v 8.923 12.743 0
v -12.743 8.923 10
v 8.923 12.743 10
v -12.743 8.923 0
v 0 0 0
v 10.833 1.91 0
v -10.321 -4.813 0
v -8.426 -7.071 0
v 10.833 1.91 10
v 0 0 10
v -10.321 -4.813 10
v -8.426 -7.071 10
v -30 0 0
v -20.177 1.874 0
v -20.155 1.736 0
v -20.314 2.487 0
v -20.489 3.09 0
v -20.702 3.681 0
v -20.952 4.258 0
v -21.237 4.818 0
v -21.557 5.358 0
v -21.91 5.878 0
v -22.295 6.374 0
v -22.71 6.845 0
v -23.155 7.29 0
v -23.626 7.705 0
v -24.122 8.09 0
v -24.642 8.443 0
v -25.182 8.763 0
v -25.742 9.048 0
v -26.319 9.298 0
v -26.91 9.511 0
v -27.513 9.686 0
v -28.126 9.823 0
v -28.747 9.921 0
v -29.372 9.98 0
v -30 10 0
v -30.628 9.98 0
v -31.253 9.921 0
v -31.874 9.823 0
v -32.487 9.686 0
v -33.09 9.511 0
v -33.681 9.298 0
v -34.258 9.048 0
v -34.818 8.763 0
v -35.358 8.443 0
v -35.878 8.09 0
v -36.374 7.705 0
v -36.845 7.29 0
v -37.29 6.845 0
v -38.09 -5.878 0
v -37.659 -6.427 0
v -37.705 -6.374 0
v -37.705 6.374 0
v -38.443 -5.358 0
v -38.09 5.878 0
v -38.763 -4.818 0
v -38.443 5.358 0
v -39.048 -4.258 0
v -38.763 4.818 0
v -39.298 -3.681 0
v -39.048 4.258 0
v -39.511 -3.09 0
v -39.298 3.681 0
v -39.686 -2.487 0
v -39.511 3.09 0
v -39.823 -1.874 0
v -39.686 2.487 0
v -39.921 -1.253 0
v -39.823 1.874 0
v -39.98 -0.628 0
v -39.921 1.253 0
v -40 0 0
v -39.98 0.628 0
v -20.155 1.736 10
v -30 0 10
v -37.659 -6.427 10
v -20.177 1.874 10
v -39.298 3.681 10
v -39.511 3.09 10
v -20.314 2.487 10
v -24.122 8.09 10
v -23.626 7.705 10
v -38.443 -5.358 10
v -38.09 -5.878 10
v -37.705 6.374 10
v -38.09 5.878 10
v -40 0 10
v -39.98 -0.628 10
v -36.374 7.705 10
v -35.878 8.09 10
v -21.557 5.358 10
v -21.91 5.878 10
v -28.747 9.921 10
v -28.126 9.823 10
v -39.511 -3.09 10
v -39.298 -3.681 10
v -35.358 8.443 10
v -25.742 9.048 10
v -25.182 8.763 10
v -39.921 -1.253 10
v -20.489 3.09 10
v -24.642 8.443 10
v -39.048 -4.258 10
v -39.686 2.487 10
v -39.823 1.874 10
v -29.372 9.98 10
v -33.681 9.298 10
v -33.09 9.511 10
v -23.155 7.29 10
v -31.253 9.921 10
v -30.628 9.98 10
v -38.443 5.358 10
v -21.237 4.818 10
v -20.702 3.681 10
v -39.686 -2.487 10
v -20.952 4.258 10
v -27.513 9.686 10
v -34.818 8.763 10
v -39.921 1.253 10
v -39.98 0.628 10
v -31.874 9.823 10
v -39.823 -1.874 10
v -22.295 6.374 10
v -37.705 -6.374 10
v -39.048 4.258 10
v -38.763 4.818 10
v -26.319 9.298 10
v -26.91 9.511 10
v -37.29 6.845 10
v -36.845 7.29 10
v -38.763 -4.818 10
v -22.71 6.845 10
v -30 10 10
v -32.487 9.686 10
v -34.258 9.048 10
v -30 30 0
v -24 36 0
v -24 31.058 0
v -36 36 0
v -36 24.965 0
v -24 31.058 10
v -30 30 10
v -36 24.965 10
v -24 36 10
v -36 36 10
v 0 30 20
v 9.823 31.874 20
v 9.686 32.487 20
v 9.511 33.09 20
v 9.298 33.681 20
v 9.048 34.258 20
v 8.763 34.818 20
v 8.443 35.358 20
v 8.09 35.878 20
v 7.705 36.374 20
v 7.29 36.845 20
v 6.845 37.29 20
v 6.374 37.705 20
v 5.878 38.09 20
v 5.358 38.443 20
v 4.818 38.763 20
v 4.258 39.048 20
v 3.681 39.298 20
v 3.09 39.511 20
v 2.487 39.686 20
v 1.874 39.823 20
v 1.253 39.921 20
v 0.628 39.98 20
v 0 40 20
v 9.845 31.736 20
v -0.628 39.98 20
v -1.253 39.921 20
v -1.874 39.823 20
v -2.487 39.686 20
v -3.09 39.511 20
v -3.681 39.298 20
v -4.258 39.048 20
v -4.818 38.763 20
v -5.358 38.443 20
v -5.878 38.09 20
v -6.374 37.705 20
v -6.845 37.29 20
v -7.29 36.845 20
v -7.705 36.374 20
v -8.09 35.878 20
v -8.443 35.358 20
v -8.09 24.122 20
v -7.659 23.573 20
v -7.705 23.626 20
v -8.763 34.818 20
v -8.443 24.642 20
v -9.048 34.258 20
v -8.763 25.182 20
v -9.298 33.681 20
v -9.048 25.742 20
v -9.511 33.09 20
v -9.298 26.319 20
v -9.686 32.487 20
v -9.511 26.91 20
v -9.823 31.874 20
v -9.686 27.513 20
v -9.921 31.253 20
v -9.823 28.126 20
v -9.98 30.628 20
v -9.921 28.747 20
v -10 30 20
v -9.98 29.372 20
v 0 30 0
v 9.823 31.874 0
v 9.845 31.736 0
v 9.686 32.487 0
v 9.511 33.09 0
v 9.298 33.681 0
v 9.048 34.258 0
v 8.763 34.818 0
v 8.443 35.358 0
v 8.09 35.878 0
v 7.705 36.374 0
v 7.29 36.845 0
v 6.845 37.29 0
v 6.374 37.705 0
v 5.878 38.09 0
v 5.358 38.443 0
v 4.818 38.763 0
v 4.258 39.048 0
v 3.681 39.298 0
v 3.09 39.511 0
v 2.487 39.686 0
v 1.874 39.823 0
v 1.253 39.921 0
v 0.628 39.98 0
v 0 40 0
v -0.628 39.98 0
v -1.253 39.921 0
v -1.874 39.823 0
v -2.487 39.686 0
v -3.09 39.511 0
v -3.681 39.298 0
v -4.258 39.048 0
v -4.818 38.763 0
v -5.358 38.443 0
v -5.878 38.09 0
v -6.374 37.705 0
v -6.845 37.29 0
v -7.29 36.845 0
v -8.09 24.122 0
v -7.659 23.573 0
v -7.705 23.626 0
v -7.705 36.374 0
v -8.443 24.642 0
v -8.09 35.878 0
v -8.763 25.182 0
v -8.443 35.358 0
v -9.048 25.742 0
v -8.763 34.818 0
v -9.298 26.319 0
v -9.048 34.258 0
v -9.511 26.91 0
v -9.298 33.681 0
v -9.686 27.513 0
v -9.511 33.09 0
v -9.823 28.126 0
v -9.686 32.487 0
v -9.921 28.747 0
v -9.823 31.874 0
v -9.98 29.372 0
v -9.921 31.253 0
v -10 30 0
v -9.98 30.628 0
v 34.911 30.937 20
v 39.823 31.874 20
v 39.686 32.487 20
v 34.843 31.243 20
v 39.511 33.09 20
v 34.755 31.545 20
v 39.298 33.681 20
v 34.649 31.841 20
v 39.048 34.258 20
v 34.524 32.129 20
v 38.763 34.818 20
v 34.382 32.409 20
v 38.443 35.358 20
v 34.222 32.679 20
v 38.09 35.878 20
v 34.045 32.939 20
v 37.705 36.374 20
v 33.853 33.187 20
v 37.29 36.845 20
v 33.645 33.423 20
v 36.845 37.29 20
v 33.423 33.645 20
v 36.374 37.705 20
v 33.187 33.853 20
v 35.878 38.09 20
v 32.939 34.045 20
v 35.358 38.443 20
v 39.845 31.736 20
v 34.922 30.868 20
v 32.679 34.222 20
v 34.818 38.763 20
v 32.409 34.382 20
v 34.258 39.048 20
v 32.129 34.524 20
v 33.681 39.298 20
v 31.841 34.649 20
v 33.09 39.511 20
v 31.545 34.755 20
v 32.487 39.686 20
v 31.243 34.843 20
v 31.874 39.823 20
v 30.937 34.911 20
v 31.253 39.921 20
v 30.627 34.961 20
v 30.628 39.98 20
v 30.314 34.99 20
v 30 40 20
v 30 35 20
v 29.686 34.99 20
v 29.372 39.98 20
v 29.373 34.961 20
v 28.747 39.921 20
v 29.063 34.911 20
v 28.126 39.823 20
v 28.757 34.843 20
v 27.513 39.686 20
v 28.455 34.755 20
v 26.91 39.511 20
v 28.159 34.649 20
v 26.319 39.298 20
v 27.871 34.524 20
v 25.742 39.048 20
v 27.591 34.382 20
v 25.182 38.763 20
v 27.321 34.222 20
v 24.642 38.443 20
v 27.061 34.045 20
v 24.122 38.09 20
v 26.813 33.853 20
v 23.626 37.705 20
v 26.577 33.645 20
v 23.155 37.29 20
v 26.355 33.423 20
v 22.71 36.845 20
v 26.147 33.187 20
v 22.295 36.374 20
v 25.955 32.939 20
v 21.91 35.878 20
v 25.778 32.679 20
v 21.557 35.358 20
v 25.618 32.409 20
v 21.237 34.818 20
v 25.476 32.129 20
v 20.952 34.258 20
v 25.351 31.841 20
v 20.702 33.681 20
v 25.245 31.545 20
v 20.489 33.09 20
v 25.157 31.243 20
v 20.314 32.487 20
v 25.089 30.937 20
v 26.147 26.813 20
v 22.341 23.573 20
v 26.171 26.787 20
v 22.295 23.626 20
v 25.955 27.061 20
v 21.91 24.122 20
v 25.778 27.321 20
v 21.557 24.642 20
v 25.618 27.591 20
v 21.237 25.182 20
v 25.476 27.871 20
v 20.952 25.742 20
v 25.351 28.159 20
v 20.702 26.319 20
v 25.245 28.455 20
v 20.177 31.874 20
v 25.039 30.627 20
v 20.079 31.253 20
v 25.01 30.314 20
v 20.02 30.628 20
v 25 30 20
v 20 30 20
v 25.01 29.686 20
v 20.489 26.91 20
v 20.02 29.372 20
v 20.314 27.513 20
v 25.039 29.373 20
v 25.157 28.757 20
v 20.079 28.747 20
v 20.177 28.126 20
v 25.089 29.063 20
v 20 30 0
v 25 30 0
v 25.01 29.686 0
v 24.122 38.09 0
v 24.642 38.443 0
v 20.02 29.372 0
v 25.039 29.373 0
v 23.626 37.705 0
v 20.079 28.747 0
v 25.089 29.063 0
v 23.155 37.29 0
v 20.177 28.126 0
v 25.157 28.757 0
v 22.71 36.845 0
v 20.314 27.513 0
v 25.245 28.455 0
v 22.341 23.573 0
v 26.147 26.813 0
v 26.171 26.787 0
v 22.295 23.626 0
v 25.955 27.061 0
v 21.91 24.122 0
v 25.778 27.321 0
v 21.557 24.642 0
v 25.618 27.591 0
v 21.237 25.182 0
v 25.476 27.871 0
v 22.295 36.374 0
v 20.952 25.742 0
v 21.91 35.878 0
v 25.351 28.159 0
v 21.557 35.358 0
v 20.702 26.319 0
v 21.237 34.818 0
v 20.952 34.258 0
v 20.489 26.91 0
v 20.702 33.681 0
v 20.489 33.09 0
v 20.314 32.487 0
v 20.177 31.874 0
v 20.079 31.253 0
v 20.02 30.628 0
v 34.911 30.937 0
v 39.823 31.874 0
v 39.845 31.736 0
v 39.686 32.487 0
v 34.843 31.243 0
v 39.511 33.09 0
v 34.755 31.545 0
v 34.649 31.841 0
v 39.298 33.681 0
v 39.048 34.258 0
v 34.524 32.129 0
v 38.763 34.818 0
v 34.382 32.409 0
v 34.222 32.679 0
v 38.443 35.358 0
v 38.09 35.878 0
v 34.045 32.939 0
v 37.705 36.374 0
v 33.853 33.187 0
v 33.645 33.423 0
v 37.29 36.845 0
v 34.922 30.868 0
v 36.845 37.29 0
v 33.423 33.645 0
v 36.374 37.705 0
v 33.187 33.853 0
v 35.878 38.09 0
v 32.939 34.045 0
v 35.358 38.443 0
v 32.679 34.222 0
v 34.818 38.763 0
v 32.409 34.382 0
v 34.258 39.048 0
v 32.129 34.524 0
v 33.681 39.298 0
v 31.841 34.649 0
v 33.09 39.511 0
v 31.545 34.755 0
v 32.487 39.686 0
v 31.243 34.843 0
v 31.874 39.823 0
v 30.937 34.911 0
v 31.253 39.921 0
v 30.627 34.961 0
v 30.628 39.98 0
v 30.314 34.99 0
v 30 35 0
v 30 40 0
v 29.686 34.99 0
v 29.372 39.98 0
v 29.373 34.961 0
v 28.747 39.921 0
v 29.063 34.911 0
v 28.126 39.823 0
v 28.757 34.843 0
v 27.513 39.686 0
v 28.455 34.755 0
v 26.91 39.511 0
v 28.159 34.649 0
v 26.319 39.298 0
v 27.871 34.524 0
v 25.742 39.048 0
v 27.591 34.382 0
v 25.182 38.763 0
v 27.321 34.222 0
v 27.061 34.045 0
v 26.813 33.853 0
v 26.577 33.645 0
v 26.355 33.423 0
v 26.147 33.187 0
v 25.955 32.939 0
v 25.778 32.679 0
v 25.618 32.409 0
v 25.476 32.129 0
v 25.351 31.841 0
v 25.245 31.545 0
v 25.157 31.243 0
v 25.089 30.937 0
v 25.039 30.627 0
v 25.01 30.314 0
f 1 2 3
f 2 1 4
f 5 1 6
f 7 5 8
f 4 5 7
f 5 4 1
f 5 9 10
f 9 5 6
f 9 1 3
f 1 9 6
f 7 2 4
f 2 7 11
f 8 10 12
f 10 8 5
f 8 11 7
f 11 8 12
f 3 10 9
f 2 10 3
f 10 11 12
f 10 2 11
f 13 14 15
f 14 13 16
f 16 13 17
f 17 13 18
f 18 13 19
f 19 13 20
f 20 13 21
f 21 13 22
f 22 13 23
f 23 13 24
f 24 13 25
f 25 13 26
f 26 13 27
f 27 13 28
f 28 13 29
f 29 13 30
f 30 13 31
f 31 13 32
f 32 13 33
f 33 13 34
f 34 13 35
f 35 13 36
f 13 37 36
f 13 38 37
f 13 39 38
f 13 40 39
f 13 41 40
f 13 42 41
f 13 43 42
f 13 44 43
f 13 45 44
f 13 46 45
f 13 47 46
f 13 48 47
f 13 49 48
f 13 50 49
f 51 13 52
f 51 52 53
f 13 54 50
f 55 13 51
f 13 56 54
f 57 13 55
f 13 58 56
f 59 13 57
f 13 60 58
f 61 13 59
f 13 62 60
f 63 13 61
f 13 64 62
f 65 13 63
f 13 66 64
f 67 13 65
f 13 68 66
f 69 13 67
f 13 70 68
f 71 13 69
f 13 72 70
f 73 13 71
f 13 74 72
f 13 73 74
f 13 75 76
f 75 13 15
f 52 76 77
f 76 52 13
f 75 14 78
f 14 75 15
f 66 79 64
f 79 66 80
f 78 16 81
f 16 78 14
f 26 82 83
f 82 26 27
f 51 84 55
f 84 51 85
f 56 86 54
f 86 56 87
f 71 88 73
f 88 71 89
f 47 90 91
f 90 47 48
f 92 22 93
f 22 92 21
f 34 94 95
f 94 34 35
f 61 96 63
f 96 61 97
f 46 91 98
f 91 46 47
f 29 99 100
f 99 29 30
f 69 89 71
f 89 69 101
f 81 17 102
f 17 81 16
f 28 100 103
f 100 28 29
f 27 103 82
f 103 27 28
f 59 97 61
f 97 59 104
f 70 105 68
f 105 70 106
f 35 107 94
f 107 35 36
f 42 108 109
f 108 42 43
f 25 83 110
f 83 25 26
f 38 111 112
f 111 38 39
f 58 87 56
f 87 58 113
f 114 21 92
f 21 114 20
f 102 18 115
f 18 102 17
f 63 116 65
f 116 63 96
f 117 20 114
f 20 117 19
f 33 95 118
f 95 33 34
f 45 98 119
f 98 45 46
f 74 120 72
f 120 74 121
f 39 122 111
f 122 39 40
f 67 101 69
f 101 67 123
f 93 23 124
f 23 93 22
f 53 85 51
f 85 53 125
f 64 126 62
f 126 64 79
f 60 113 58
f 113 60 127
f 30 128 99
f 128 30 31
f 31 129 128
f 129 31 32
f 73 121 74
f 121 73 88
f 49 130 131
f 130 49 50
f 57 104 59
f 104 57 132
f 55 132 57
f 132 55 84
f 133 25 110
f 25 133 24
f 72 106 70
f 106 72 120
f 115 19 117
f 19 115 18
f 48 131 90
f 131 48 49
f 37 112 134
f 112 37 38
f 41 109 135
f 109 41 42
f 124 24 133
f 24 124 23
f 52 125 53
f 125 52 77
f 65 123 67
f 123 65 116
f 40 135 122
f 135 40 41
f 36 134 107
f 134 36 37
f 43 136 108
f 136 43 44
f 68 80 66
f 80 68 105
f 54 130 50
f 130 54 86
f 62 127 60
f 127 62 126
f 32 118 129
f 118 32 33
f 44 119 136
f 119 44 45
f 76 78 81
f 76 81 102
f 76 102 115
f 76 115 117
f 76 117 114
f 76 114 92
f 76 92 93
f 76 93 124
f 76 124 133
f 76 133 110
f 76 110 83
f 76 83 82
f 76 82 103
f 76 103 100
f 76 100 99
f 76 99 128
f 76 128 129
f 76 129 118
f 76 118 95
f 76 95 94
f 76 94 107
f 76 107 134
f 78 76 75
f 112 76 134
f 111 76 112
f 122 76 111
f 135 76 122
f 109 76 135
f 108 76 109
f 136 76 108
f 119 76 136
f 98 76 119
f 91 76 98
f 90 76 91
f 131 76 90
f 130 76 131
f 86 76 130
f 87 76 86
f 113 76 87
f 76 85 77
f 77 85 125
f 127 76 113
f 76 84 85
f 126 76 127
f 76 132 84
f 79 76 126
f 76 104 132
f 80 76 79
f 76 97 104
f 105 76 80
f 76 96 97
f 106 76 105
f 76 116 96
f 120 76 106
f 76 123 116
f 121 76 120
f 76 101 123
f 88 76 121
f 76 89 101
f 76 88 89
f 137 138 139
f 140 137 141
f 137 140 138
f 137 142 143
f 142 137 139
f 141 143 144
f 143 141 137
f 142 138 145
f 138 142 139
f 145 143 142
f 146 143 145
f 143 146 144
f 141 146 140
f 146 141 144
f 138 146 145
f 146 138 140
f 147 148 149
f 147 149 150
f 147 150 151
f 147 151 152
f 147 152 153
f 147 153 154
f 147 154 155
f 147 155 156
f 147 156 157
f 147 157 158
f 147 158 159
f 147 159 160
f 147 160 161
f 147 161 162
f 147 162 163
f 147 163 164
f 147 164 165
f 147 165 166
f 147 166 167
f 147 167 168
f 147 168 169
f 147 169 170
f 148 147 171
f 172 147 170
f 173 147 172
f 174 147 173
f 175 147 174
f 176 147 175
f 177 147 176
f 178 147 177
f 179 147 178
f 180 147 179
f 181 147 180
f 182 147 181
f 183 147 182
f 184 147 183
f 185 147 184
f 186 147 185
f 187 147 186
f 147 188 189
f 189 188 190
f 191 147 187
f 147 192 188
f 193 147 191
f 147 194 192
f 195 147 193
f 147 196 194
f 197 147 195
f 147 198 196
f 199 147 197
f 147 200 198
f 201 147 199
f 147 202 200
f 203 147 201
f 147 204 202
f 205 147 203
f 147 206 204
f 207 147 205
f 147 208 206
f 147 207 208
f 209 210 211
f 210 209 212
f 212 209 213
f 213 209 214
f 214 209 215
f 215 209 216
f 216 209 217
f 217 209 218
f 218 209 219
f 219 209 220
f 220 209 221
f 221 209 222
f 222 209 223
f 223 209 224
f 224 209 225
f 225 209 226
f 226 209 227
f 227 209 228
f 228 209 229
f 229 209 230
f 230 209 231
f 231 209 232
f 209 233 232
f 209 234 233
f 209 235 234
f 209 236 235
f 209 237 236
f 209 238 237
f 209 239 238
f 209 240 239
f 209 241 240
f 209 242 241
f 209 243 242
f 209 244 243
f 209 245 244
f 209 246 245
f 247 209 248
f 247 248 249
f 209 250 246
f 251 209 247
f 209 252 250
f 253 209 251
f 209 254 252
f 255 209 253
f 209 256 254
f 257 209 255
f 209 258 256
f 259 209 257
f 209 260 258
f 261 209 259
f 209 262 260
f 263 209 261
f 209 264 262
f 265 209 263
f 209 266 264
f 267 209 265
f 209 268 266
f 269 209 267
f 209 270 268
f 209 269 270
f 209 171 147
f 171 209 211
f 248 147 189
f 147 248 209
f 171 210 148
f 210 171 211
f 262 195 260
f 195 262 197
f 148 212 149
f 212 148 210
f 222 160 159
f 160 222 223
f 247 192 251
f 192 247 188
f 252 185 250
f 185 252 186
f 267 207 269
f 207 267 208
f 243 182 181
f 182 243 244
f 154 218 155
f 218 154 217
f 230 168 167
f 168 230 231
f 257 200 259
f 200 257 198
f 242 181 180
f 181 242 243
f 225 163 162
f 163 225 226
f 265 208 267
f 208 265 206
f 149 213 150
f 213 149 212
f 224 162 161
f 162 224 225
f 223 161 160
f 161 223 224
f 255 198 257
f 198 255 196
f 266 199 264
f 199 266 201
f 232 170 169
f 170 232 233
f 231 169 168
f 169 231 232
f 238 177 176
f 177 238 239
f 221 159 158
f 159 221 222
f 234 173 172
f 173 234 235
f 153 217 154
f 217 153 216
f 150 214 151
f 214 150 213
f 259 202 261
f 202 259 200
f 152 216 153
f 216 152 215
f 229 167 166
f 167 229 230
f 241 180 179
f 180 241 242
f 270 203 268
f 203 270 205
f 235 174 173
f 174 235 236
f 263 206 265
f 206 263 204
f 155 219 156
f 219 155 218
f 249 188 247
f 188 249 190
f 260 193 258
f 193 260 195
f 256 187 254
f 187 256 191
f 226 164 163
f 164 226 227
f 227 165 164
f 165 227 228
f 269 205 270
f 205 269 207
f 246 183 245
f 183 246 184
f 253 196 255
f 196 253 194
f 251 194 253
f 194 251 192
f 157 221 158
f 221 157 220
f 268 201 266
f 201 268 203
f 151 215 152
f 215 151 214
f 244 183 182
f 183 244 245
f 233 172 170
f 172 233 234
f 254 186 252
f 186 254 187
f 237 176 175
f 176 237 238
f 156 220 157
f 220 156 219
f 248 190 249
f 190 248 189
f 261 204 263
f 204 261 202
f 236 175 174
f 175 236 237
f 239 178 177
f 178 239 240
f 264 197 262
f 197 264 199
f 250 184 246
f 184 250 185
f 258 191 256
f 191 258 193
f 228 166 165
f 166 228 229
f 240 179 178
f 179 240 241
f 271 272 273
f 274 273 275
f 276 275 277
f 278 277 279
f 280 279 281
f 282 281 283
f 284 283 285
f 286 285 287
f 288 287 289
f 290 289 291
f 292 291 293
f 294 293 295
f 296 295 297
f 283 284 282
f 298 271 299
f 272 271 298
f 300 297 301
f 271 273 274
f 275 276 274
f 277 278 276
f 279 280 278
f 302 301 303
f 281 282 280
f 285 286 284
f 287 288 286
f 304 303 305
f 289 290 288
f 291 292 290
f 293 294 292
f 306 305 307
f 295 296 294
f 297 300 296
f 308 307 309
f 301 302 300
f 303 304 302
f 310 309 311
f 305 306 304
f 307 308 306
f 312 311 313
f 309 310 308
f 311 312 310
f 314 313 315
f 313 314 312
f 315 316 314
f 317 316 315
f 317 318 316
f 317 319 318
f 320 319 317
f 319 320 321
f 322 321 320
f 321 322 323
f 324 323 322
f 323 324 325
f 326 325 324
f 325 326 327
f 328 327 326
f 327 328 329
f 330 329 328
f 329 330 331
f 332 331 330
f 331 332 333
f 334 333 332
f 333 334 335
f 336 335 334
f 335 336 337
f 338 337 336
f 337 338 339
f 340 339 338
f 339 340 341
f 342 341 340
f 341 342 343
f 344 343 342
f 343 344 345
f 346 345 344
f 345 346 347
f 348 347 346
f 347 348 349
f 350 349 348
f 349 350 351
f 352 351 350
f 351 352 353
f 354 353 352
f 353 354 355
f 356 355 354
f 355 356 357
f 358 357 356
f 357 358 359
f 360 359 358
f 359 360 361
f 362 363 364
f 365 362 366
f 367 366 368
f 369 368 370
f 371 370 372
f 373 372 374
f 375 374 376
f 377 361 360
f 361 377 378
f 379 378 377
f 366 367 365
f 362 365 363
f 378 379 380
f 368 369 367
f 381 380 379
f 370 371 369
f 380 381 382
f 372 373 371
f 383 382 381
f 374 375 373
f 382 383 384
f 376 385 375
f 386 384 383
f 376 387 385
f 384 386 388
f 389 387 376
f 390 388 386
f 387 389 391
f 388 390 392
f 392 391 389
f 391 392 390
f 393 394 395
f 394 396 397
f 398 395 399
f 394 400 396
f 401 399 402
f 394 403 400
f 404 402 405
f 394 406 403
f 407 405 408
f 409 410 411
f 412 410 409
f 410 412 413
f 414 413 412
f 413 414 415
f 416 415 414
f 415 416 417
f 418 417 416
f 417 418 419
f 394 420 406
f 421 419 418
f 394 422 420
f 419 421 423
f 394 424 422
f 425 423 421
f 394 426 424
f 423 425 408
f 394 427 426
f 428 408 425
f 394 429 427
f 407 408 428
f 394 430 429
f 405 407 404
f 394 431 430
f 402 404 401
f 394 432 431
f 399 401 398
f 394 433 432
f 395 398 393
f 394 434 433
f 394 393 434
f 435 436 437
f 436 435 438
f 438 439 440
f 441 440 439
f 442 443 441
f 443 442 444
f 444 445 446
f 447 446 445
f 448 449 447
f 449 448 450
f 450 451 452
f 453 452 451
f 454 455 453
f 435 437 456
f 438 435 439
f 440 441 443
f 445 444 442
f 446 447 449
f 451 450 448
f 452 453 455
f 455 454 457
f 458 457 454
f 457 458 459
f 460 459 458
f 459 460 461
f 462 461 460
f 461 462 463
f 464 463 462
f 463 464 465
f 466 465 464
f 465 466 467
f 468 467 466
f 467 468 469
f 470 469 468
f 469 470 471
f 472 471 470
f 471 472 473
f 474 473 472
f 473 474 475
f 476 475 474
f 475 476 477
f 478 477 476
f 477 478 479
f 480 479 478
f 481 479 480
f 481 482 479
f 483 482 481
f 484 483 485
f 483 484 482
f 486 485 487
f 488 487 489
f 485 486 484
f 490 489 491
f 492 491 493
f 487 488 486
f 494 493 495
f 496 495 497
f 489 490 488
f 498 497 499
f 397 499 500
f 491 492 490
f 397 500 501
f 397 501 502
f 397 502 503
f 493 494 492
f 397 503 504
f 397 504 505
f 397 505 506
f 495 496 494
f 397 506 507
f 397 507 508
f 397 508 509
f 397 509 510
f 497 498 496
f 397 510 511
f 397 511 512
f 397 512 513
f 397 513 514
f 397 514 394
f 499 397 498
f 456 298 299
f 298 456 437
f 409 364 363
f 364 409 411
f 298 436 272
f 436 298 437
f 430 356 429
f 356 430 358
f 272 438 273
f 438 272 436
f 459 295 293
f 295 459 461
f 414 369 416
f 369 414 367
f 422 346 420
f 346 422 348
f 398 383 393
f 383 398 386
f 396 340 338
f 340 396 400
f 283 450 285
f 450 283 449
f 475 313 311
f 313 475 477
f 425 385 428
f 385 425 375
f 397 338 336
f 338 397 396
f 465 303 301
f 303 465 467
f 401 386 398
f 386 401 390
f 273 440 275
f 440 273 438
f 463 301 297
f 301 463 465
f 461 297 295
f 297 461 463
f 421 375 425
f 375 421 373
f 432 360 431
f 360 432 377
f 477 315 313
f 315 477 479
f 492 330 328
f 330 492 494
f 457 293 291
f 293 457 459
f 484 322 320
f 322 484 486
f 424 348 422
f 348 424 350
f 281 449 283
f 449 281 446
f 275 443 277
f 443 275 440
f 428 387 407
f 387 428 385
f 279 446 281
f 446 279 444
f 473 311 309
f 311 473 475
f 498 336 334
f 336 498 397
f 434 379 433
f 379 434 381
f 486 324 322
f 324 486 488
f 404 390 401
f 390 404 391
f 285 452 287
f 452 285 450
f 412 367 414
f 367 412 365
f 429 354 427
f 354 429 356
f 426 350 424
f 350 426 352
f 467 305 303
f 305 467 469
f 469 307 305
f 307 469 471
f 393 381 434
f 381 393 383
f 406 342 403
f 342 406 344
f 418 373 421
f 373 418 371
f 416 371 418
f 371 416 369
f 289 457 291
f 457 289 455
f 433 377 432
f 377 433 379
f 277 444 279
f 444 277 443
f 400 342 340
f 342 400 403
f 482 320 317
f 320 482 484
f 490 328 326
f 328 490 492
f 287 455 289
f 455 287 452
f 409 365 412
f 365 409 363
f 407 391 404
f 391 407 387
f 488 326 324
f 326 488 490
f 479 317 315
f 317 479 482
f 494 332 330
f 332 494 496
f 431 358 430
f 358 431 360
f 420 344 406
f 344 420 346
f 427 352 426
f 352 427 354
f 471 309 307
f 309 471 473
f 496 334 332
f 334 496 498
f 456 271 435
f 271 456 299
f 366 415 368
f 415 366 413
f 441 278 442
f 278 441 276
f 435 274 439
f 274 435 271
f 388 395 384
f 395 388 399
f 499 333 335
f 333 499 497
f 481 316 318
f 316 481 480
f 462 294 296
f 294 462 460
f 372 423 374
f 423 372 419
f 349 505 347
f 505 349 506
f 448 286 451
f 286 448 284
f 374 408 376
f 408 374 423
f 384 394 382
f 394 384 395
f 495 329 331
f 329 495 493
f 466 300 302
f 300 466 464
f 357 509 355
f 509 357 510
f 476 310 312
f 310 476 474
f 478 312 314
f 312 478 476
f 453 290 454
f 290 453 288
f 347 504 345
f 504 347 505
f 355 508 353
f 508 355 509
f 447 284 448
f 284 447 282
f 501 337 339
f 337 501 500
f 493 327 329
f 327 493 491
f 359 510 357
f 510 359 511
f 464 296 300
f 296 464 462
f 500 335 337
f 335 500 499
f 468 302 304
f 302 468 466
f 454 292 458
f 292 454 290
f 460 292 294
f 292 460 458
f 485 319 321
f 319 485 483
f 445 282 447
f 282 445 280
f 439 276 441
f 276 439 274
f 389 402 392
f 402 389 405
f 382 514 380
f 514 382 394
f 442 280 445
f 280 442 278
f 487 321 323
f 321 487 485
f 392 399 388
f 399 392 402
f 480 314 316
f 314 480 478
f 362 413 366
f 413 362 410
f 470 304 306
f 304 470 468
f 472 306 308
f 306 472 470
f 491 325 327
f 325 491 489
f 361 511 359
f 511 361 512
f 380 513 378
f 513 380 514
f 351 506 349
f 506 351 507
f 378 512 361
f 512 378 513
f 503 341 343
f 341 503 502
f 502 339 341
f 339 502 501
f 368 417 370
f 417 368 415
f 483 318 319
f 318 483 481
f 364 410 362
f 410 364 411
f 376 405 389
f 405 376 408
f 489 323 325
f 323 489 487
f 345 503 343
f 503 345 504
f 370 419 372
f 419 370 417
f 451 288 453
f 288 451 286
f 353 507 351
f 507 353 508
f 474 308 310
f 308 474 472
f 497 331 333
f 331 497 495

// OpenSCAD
// Part of the openscad_primitves library

// Operator cylinder_wedge operator reduces an object to a wedge of a given
// radius, angle and height. The outer edge can optionally be smoothed.

// Call syntax:
// cylinder_wedge( r, h, start_angle, angle, smooth_fn=0 ) { }
// where
//     r - radius of the wedge
//     h - height of the wedge
//     start_angle - angle where the wedge starts
//     angle - angle covered by the edge
//     smooth_fn - defaults to zero. If not zero, the value is treated as
//     $fn passed to a cylinder that is intersected to smooth the outher
//     boundary.

// Wedge is constructed by making an union of whole cubes to cover
// multiples of 90 degrees, with the remainder being an intersection of two
// rotated cubes. This construct is intersected with the first child object
// in the operator's scope.

// Algorithm gives a rectangular outer perimeter, which does not matter if
// the object being trimmed is a cylinder or smaller than the given radius.
// If the smooth_fn is nonzero, the child object is first intesected with a
// cylinder of the wedge raius and height, with smooth_fn passed as the $fn
// to the cylinder call.
// 
// See examples on the bottom.

// By Nenad Rijavec.
// Feel free to use and modify as you see fit.

// we use the rotated cube intersection trick to get wedges

// operates on the first child
module cylinder_wedge( r, h, start_angle, angle, smooth_fn=0 )
{
	r_wrk = r+1 ;
	a = floor( angle/90 ) ;
	offset = 90 * a ;
	rem = angle - offset ;
	intersection() {
		union() {
			if ( a > 0 ) for ( i=[0:a-1] ) {
				rotate( [ 0, 0, start_angle+90 * i ] )
					cube( [ r_wrk, r_wrk, h ] ) ;
			}
			intersection() {
				rotate( [ 0, 0, start_angle+offset-90+rem] )
					cube( [ r_wrk, r_wrk, h ] ) ;
				rotate( [ 0, 0, start_angle+offset] )
					cube( [ r_wrk, r_wrk, h ] ) ;
			}
		}
		if ( smooth_fn == 0 )
			children( 0 ) ;
		else intersection() {
			cylinder( h, r=r, $fn=smooth_fn ) ;
			children( 0 ) ;
		}
	}
}

// examples: all have r=10, h=20, start_angle=10, angle=210

// trim a cube, so the effect of outer smoothness shows
// no outer smoothing, cube being trimmed bigger than r
cylinder_wedge( 10, 20, 10, 210 )
	cube( [ 30, 30, 20 ], center=true ) ;
// outer smoothing, cube being trimmed bigger than r
translate( [ -30, 0, 0 ] )
	cylinder_wedge( 10, 20, 10, 210, 100 )
		cube( [ 30, 30, 20 ], center=true ) ;
// cube being trimmed smaller than r: outer smoothing has no effect
translate( [ -30, 30, 0 ] )
	cylinder_wedge( 10, 20, 10, 210, 100 )
		cube( [ 12, 12, 20 ], center=true ) ;

// cylinder wedge - no need to smooth
translate( [ 0, 30, 0 ] )
	cylinder_wedge( 10, 20, 10, 210 )
		cylinder( 20, r=10, $fn=100 ) ;

// ring wedge
translate( [ 30, 30, 0 ] )
	cylinder_wedge( 10, 20, 10, 210 )
	difference() {
		cylinder( 20, r=10, $fn=100 ) ;
		translate( [ 0, 0, -0.5 ] )
		cylinder( 21, r=5, $fn=100 ) ;
	}

// nenad me fecit
